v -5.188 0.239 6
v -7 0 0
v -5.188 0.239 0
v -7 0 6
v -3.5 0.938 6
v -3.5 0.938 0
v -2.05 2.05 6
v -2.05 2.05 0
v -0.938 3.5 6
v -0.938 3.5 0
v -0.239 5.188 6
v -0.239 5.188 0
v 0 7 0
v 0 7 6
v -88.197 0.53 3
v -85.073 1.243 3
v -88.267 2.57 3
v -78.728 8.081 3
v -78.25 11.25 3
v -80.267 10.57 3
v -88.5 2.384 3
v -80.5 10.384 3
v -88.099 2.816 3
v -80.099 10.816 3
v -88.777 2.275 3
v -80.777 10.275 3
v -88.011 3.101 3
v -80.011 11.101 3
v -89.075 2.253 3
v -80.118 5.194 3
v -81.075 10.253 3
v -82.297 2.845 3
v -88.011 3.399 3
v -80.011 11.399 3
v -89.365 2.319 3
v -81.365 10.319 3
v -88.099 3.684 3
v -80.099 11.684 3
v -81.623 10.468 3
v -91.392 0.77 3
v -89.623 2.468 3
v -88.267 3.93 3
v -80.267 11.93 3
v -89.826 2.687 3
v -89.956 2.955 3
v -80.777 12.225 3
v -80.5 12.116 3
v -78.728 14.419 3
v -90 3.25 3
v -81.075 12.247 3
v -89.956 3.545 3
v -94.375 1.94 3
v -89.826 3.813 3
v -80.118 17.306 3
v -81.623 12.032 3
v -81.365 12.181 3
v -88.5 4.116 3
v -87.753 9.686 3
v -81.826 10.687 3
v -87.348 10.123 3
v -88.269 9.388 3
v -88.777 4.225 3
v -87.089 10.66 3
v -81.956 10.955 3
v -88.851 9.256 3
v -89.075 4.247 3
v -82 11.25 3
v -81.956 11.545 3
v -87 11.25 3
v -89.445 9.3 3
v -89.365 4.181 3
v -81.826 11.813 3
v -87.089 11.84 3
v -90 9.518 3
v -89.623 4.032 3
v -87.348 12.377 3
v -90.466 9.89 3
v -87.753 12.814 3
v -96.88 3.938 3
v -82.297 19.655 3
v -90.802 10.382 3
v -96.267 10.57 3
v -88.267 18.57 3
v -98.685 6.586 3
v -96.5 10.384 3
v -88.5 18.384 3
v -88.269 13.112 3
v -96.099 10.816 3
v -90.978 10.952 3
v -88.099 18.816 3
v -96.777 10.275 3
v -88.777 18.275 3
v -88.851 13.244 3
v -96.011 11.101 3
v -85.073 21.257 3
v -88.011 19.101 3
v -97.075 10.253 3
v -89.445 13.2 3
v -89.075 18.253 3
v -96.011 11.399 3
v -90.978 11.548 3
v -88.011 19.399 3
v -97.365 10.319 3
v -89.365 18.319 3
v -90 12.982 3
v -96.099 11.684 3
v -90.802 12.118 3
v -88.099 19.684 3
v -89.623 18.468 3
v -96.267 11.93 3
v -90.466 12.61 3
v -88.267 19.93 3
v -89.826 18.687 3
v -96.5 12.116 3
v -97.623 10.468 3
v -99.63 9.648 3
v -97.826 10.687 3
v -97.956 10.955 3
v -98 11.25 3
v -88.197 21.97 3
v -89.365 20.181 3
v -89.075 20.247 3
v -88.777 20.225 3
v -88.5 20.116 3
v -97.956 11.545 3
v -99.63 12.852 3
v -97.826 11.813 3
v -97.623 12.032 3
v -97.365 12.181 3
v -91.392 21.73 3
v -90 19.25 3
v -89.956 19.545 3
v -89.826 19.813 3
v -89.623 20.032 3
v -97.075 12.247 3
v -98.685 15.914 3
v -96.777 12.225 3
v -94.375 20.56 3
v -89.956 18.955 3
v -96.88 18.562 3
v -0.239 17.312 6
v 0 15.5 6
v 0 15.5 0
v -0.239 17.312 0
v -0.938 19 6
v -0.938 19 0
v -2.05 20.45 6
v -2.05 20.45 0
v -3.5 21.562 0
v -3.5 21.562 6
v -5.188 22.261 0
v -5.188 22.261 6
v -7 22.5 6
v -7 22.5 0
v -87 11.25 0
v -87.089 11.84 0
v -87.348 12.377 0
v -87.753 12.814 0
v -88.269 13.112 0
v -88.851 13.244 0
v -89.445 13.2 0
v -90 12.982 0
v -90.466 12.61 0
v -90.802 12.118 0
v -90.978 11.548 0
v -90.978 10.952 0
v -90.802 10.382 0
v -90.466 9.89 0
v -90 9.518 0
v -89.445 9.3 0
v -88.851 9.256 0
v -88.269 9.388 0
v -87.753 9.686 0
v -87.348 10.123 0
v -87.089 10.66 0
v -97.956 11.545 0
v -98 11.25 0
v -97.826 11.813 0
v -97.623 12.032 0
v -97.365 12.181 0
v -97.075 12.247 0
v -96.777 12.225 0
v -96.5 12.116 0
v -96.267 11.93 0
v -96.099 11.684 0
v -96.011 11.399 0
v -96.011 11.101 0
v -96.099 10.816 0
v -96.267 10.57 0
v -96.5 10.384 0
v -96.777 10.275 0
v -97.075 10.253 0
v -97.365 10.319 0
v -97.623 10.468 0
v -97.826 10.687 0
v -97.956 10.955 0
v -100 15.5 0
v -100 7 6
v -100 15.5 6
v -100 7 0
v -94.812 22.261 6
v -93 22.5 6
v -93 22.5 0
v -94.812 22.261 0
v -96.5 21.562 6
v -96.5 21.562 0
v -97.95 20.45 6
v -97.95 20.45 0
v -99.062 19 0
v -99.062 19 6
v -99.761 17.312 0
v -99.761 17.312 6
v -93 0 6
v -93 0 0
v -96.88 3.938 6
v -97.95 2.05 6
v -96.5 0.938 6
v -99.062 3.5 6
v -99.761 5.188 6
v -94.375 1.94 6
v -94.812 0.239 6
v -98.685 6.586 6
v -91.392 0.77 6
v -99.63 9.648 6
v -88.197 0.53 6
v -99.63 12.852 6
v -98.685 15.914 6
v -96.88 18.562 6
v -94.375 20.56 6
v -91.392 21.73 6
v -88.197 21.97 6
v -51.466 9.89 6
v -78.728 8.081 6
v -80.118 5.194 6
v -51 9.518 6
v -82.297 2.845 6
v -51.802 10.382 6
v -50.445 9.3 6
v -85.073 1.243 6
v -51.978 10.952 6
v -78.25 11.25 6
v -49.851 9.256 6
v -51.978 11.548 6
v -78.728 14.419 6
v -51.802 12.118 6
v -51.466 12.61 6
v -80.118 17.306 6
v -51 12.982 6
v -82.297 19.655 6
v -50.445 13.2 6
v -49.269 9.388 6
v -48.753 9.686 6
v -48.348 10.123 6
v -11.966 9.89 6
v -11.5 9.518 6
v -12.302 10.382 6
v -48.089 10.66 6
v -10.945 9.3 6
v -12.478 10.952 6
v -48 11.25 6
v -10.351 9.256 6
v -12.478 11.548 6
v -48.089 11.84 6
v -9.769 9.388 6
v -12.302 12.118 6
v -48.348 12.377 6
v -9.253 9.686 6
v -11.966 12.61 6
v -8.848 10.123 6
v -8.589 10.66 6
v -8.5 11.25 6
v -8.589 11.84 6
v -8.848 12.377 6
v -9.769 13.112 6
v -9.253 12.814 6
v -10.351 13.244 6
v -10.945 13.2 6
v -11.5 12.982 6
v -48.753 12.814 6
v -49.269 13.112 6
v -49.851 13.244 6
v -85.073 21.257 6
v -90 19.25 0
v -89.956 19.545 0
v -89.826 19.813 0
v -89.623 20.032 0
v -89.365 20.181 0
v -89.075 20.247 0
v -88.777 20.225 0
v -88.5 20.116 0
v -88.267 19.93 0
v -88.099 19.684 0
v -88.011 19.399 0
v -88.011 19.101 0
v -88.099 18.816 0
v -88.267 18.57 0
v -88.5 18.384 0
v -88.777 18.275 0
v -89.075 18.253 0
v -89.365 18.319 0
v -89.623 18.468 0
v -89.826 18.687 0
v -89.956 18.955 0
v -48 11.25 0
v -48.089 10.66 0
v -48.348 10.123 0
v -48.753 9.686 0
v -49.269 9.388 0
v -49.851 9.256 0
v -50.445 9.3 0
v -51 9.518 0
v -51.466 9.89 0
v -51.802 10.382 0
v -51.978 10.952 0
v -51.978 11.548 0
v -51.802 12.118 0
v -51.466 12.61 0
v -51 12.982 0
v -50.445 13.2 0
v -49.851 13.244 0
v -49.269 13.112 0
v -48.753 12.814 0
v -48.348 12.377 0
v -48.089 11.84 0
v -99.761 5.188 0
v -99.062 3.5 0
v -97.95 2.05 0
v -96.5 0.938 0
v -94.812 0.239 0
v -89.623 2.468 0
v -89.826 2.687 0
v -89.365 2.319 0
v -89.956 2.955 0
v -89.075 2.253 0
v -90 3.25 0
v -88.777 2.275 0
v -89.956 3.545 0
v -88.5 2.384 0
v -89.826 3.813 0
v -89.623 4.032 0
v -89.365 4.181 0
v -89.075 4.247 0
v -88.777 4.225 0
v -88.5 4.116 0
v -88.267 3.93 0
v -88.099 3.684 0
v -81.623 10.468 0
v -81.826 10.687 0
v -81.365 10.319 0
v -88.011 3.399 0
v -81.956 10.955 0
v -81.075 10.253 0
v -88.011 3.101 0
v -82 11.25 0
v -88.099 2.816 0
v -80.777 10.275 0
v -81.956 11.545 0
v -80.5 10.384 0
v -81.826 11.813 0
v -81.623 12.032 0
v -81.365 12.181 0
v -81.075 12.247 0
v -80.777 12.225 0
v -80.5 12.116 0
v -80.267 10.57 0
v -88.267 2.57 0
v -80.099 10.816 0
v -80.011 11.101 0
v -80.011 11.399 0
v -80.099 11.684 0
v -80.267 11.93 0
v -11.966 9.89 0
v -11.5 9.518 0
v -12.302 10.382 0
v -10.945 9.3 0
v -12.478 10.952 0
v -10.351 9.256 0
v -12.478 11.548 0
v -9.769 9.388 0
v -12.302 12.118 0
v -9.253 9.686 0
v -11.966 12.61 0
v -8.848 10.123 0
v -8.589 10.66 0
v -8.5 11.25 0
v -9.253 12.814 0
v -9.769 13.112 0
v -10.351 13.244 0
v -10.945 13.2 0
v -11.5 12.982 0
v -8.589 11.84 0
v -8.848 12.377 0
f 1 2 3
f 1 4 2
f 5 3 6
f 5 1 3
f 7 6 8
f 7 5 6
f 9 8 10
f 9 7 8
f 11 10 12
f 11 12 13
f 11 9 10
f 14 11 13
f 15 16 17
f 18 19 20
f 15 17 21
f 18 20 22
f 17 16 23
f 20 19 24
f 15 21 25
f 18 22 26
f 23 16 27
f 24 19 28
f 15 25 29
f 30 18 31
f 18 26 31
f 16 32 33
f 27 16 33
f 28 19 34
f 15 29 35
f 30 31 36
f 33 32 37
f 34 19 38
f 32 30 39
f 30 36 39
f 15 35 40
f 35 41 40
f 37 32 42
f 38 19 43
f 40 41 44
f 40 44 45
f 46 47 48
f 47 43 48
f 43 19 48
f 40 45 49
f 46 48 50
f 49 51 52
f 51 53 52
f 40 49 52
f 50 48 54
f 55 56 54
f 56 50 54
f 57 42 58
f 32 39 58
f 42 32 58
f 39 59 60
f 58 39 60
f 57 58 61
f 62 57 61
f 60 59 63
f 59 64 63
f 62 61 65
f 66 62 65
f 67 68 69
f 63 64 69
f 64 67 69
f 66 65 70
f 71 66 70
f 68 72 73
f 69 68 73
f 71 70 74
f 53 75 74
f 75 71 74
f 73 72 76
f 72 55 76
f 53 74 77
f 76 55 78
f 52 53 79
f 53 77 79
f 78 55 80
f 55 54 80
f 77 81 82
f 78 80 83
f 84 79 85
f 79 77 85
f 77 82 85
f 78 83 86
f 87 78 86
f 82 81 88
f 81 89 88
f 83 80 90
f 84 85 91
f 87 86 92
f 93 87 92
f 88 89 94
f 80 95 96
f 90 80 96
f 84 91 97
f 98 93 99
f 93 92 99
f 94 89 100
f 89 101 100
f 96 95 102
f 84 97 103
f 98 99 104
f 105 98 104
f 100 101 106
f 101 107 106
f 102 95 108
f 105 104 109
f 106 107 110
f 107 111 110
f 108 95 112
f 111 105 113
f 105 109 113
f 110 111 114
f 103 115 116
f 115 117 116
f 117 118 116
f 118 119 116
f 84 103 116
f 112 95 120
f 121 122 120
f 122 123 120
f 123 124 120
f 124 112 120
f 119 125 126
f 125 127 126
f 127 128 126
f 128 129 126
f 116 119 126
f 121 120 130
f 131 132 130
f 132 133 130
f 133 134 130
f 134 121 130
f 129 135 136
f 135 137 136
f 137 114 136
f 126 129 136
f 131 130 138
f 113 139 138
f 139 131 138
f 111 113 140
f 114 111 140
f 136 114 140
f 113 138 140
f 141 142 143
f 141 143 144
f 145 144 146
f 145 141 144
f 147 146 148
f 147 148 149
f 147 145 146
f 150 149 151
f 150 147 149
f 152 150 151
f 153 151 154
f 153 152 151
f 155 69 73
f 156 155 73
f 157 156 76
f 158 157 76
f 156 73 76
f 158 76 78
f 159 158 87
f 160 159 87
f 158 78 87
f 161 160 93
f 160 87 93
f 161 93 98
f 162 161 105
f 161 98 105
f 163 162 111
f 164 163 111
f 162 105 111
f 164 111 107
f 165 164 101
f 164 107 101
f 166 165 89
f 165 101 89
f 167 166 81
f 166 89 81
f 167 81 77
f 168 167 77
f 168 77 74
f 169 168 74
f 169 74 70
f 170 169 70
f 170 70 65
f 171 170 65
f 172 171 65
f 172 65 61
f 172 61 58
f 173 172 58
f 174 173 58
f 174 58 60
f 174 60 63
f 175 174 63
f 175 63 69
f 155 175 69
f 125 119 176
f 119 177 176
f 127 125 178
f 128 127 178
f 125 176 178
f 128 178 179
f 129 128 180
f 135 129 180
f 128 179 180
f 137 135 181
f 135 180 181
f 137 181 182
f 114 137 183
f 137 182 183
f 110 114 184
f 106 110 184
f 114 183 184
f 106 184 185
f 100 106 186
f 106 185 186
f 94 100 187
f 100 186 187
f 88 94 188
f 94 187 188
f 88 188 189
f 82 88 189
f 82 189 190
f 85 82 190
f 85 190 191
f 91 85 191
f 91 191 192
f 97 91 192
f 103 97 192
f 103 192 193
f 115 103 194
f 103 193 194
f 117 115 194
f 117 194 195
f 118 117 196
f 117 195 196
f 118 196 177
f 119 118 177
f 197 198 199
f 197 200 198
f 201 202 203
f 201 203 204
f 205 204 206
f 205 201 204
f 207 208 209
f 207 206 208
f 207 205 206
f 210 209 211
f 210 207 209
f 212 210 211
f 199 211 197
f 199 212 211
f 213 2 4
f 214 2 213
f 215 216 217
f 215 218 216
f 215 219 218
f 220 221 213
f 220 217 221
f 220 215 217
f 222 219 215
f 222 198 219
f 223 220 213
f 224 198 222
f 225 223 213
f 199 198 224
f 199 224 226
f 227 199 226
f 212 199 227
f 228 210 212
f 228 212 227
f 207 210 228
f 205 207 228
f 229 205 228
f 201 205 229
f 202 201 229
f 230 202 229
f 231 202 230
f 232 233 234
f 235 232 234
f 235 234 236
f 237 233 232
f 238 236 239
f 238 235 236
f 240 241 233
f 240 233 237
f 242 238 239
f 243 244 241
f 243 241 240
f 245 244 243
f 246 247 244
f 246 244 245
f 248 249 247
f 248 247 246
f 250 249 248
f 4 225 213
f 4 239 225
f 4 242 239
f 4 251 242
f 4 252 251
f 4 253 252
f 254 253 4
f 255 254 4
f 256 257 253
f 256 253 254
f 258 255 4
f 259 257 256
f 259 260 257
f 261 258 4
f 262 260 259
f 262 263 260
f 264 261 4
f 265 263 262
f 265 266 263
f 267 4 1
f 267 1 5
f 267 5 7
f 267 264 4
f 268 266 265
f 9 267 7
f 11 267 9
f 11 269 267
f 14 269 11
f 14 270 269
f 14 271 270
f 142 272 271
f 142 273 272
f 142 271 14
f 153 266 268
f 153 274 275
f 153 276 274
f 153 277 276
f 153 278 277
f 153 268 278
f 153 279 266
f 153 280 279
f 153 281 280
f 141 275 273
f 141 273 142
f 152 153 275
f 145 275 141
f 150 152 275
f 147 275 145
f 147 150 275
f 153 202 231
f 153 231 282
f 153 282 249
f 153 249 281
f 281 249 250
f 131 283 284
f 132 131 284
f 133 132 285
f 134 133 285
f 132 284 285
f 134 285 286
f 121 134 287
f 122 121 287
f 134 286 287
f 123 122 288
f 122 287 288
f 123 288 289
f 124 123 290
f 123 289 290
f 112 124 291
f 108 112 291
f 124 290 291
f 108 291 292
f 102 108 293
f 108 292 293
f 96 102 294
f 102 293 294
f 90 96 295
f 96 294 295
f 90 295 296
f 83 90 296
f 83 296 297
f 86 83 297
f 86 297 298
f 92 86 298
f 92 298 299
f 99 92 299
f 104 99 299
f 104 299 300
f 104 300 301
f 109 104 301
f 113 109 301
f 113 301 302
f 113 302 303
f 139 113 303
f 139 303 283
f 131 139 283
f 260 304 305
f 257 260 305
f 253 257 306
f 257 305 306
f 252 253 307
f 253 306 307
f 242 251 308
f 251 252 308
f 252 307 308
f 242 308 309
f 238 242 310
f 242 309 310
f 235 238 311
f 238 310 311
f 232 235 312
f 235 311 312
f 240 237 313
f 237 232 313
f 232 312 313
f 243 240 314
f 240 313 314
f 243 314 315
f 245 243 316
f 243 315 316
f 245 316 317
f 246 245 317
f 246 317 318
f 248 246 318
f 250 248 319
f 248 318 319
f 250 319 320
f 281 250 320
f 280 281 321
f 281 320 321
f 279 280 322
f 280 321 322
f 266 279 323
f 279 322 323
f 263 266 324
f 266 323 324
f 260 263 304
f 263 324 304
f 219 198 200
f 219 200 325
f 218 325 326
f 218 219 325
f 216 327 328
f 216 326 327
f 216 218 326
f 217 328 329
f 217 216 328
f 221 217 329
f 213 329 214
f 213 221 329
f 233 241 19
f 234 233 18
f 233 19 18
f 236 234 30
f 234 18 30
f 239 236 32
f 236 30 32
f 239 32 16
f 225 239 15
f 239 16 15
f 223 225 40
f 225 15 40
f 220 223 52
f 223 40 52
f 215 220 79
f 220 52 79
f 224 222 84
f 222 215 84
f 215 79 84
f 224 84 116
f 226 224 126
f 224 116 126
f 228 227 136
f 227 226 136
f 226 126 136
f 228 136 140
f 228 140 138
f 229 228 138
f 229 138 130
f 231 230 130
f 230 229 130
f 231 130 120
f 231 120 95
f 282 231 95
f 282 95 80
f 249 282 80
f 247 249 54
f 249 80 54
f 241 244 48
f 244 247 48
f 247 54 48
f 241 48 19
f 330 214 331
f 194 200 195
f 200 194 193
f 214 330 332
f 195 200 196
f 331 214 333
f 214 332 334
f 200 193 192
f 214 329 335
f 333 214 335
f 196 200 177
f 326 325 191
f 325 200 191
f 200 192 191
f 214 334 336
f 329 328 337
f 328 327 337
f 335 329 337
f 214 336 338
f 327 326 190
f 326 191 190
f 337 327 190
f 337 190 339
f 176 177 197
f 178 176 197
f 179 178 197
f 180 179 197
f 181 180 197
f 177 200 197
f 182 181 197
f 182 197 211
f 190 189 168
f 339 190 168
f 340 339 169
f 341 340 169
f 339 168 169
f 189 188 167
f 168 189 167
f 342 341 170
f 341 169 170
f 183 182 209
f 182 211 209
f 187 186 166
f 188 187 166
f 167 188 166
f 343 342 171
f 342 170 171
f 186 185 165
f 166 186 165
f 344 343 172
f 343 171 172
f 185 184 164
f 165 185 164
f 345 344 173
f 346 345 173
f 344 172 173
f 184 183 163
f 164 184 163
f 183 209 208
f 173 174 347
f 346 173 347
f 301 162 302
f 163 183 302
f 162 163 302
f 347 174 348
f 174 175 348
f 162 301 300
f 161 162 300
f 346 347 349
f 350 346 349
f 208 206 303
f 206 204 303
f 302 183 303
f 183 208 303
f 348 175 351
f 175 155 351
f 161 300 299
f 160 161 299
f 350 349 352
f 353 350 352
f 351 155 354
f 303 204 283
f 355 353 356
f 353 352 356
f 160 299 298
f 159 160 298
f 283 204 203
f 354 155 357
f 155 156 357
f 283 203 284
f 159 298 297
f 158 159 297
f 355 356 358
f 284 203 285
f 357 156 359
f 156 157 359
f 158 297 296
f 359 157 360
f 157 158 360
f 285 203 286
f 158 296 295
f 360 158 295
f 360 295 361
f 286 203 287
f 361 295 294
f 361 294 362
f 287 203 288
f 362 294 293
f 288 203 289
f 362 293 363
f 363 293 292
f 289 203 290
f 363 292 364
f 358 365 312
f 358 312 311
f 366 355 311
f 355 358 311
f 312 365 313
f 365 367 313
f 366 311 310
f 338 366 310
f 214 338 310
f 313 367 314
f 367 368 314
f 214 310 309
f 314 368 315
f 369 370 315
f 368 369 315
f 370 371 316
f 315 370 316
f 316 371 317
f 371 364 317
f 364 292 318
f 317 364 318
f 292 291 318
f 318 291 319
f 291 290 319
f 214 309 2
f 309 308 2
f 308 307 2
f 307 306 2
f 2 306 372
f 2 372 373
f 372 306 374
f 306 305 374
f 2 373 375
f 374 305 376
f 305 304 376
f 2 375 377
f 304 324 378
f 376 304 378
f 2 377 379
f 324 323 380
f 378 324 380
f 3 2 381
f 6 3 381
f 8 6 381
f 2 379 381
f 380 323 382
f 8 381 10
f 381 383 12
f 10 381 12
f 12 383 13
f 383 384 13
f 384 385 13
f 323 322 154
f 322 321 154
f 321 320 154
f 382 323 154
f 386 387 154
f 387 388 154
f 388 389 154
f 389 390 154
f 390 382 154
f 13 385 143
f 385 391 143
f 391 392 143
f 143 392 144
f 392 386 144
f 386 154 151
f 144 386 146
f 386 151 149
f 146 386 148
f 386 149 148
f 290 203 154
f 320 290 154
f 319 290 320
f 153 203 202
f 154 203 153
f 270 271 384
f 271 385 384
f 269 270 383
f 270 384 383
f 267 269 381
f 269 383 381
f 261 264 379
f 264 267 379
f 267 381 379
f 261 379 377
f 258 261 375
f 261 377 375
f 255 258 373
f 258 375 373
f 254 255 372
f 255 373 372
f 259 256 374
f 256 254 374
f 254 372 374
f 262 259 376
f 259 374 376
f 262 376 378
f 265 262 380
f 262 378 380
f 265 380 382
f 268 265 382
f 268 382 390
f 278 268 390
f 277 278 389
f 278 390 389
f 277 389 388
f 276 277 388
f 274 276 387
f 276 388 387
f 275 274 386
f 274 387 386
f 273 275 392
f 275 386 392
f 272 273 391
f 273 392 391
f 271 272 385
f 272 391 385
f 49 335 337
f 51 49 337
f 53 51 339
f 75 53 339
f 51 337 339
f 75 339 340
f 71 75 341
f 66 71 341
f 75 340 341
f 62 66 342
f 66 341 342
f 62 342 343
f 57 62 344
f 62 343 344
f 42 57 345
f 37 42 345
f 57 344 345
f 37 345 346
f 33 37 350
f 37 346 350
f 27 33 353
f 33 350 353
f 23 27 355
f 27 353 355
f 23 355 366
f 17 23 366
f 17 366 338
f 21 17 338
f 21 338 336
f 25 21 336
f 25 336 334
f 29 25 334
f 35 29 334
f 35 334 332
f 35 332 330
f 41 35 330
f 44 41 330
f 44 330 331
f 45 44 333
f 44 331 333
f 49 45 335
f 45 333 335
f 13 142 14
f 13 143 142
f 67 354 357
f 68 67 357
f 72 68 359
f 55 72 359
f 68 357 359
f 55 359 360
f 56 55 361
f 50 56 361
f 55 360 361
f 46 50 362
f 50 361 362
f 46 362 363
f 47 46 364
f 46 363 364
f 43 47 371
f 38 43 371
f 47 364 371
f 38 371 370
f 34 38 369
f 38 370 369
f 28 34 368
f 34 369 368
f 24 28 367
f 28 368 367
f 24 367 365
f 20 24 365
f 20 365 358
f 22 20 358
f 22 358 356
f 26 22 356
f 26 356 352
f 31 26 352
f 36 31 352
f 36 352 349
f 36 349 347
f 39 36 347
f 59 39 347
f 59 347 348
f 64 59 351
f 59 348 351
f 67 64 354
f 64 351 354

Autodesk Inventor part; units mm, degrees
ref_plane "YZ Plane" through (0, 0, 0) normal (1, 0, 0) x (0, 1, 0)
ref_plane "XZ Plane" through (0, 0, 0) normal (0, 1, 0) x (-1, 0, 0)
ref_plane "XY Plane" through (0, 0, 0) normal (0, 0, 1) x (1, 0, 0)
sketch "Эскиз1" plane through (0, 0, 0) normal (0, 0, 1) x (1, 0, 0)
  line L0 (0, 0) -> (-100, 0)
  line L1 (-100, 0) -> (-100, 22.5)
  line L2 (-100, 22.5) -> (0, 22.5)
  line L3 (0, 22.5) -> (0, 0)
  line L4 (-100, 11.25) -> (0, 11.25) construction
  line L5 (0, 11.25) -> (-10.5, 11.25) construction
  circle A0 centre (-10.5, 11.25) radius 10.5 construction
  circle A1 centre (-89, 11.25) radius 10.75
  line L6 (-50, 0) -> (-50, 22.5) construction
  circle A2 centre (-50, 11.25) radius 2
  circle A3 centre (-10.5, 11.25) radius 2
  dimension "d0" = 100
  dimension "d1" = 22.5
  dimension "d2" = 10.5
  dimension "d3" = 11
  dimension "d4" = 21
  dimension "d5" = 21.5
  dimension "d6" = 4
  dimension "d7" = 4
extrude "Выдавливание1" add sketch "Эскиз1" along normal blind 6
sketch "Эскиз2" plane through (0, 0, 0) normal (0, 0, -1) x (-1, 0, 0)
  circle A0 centre (89, 11.25) radius 10.75 projected
  circle A1 centre (89, 11.25) radius 10.75
  point P0 (0, 0)
  point P1 (89.5, 21)
  point P2 (89.5, 0)
  dimension "d23" = 21.5
extrude "Выдавливание2" add sketch "Эскиз2" against normal blind 3
sketch "Эскиз3" plane through (0, 0, 3) normal (0, 0, 1) x (1, 0, 0)
  circle A0 centre (-89, 11.25) radius 10.75 projected
  circle A1 centre (-89, 11.25) radius 2
  point P0 (0, 0)
  point P1 (-89.5, 21)
  point P2 (-89.5, 0)
  dimension "d12" = 4
extrude "Выдавливание3" cut sketch "Эскиз3" against normal blind 3 contours A1
fillet "Сопряжение1" radius 7 4 edges at (0, 22.5, 3) (0, 0, 3) (-100, 22.5, 3) (-100, 0, 3)
sketch "Эскиз4" plane through (0, 0, 0) normal (0, 0, -1) x (-1, 0, 0)
  circle A0 centre (89, 11.25) radius 2 projected
  circle A1 centre (89, 11.25) radius 8 construction
  circle A2 centre (81, 11.25) radius 1
  circle A3 centre (89, 3.25) radius 1
  circle A4 centre (97, 11.25) radius 1
  circle A5 centre (89, 19.25) radius 1
  point P0 (0, 0)
  dimension "d16" = 16
  dimension "d17" = 2
  dimension "d18" = 2
  dimension "d19" = 2
  dimension "d20" = 2
extrude "Выдавливание4" cut sketch "Эскиз4" against normal blind 6 contours A2 | A3 | A4 | A5
properties part number "peregorodka" material "Пластик АБС"
